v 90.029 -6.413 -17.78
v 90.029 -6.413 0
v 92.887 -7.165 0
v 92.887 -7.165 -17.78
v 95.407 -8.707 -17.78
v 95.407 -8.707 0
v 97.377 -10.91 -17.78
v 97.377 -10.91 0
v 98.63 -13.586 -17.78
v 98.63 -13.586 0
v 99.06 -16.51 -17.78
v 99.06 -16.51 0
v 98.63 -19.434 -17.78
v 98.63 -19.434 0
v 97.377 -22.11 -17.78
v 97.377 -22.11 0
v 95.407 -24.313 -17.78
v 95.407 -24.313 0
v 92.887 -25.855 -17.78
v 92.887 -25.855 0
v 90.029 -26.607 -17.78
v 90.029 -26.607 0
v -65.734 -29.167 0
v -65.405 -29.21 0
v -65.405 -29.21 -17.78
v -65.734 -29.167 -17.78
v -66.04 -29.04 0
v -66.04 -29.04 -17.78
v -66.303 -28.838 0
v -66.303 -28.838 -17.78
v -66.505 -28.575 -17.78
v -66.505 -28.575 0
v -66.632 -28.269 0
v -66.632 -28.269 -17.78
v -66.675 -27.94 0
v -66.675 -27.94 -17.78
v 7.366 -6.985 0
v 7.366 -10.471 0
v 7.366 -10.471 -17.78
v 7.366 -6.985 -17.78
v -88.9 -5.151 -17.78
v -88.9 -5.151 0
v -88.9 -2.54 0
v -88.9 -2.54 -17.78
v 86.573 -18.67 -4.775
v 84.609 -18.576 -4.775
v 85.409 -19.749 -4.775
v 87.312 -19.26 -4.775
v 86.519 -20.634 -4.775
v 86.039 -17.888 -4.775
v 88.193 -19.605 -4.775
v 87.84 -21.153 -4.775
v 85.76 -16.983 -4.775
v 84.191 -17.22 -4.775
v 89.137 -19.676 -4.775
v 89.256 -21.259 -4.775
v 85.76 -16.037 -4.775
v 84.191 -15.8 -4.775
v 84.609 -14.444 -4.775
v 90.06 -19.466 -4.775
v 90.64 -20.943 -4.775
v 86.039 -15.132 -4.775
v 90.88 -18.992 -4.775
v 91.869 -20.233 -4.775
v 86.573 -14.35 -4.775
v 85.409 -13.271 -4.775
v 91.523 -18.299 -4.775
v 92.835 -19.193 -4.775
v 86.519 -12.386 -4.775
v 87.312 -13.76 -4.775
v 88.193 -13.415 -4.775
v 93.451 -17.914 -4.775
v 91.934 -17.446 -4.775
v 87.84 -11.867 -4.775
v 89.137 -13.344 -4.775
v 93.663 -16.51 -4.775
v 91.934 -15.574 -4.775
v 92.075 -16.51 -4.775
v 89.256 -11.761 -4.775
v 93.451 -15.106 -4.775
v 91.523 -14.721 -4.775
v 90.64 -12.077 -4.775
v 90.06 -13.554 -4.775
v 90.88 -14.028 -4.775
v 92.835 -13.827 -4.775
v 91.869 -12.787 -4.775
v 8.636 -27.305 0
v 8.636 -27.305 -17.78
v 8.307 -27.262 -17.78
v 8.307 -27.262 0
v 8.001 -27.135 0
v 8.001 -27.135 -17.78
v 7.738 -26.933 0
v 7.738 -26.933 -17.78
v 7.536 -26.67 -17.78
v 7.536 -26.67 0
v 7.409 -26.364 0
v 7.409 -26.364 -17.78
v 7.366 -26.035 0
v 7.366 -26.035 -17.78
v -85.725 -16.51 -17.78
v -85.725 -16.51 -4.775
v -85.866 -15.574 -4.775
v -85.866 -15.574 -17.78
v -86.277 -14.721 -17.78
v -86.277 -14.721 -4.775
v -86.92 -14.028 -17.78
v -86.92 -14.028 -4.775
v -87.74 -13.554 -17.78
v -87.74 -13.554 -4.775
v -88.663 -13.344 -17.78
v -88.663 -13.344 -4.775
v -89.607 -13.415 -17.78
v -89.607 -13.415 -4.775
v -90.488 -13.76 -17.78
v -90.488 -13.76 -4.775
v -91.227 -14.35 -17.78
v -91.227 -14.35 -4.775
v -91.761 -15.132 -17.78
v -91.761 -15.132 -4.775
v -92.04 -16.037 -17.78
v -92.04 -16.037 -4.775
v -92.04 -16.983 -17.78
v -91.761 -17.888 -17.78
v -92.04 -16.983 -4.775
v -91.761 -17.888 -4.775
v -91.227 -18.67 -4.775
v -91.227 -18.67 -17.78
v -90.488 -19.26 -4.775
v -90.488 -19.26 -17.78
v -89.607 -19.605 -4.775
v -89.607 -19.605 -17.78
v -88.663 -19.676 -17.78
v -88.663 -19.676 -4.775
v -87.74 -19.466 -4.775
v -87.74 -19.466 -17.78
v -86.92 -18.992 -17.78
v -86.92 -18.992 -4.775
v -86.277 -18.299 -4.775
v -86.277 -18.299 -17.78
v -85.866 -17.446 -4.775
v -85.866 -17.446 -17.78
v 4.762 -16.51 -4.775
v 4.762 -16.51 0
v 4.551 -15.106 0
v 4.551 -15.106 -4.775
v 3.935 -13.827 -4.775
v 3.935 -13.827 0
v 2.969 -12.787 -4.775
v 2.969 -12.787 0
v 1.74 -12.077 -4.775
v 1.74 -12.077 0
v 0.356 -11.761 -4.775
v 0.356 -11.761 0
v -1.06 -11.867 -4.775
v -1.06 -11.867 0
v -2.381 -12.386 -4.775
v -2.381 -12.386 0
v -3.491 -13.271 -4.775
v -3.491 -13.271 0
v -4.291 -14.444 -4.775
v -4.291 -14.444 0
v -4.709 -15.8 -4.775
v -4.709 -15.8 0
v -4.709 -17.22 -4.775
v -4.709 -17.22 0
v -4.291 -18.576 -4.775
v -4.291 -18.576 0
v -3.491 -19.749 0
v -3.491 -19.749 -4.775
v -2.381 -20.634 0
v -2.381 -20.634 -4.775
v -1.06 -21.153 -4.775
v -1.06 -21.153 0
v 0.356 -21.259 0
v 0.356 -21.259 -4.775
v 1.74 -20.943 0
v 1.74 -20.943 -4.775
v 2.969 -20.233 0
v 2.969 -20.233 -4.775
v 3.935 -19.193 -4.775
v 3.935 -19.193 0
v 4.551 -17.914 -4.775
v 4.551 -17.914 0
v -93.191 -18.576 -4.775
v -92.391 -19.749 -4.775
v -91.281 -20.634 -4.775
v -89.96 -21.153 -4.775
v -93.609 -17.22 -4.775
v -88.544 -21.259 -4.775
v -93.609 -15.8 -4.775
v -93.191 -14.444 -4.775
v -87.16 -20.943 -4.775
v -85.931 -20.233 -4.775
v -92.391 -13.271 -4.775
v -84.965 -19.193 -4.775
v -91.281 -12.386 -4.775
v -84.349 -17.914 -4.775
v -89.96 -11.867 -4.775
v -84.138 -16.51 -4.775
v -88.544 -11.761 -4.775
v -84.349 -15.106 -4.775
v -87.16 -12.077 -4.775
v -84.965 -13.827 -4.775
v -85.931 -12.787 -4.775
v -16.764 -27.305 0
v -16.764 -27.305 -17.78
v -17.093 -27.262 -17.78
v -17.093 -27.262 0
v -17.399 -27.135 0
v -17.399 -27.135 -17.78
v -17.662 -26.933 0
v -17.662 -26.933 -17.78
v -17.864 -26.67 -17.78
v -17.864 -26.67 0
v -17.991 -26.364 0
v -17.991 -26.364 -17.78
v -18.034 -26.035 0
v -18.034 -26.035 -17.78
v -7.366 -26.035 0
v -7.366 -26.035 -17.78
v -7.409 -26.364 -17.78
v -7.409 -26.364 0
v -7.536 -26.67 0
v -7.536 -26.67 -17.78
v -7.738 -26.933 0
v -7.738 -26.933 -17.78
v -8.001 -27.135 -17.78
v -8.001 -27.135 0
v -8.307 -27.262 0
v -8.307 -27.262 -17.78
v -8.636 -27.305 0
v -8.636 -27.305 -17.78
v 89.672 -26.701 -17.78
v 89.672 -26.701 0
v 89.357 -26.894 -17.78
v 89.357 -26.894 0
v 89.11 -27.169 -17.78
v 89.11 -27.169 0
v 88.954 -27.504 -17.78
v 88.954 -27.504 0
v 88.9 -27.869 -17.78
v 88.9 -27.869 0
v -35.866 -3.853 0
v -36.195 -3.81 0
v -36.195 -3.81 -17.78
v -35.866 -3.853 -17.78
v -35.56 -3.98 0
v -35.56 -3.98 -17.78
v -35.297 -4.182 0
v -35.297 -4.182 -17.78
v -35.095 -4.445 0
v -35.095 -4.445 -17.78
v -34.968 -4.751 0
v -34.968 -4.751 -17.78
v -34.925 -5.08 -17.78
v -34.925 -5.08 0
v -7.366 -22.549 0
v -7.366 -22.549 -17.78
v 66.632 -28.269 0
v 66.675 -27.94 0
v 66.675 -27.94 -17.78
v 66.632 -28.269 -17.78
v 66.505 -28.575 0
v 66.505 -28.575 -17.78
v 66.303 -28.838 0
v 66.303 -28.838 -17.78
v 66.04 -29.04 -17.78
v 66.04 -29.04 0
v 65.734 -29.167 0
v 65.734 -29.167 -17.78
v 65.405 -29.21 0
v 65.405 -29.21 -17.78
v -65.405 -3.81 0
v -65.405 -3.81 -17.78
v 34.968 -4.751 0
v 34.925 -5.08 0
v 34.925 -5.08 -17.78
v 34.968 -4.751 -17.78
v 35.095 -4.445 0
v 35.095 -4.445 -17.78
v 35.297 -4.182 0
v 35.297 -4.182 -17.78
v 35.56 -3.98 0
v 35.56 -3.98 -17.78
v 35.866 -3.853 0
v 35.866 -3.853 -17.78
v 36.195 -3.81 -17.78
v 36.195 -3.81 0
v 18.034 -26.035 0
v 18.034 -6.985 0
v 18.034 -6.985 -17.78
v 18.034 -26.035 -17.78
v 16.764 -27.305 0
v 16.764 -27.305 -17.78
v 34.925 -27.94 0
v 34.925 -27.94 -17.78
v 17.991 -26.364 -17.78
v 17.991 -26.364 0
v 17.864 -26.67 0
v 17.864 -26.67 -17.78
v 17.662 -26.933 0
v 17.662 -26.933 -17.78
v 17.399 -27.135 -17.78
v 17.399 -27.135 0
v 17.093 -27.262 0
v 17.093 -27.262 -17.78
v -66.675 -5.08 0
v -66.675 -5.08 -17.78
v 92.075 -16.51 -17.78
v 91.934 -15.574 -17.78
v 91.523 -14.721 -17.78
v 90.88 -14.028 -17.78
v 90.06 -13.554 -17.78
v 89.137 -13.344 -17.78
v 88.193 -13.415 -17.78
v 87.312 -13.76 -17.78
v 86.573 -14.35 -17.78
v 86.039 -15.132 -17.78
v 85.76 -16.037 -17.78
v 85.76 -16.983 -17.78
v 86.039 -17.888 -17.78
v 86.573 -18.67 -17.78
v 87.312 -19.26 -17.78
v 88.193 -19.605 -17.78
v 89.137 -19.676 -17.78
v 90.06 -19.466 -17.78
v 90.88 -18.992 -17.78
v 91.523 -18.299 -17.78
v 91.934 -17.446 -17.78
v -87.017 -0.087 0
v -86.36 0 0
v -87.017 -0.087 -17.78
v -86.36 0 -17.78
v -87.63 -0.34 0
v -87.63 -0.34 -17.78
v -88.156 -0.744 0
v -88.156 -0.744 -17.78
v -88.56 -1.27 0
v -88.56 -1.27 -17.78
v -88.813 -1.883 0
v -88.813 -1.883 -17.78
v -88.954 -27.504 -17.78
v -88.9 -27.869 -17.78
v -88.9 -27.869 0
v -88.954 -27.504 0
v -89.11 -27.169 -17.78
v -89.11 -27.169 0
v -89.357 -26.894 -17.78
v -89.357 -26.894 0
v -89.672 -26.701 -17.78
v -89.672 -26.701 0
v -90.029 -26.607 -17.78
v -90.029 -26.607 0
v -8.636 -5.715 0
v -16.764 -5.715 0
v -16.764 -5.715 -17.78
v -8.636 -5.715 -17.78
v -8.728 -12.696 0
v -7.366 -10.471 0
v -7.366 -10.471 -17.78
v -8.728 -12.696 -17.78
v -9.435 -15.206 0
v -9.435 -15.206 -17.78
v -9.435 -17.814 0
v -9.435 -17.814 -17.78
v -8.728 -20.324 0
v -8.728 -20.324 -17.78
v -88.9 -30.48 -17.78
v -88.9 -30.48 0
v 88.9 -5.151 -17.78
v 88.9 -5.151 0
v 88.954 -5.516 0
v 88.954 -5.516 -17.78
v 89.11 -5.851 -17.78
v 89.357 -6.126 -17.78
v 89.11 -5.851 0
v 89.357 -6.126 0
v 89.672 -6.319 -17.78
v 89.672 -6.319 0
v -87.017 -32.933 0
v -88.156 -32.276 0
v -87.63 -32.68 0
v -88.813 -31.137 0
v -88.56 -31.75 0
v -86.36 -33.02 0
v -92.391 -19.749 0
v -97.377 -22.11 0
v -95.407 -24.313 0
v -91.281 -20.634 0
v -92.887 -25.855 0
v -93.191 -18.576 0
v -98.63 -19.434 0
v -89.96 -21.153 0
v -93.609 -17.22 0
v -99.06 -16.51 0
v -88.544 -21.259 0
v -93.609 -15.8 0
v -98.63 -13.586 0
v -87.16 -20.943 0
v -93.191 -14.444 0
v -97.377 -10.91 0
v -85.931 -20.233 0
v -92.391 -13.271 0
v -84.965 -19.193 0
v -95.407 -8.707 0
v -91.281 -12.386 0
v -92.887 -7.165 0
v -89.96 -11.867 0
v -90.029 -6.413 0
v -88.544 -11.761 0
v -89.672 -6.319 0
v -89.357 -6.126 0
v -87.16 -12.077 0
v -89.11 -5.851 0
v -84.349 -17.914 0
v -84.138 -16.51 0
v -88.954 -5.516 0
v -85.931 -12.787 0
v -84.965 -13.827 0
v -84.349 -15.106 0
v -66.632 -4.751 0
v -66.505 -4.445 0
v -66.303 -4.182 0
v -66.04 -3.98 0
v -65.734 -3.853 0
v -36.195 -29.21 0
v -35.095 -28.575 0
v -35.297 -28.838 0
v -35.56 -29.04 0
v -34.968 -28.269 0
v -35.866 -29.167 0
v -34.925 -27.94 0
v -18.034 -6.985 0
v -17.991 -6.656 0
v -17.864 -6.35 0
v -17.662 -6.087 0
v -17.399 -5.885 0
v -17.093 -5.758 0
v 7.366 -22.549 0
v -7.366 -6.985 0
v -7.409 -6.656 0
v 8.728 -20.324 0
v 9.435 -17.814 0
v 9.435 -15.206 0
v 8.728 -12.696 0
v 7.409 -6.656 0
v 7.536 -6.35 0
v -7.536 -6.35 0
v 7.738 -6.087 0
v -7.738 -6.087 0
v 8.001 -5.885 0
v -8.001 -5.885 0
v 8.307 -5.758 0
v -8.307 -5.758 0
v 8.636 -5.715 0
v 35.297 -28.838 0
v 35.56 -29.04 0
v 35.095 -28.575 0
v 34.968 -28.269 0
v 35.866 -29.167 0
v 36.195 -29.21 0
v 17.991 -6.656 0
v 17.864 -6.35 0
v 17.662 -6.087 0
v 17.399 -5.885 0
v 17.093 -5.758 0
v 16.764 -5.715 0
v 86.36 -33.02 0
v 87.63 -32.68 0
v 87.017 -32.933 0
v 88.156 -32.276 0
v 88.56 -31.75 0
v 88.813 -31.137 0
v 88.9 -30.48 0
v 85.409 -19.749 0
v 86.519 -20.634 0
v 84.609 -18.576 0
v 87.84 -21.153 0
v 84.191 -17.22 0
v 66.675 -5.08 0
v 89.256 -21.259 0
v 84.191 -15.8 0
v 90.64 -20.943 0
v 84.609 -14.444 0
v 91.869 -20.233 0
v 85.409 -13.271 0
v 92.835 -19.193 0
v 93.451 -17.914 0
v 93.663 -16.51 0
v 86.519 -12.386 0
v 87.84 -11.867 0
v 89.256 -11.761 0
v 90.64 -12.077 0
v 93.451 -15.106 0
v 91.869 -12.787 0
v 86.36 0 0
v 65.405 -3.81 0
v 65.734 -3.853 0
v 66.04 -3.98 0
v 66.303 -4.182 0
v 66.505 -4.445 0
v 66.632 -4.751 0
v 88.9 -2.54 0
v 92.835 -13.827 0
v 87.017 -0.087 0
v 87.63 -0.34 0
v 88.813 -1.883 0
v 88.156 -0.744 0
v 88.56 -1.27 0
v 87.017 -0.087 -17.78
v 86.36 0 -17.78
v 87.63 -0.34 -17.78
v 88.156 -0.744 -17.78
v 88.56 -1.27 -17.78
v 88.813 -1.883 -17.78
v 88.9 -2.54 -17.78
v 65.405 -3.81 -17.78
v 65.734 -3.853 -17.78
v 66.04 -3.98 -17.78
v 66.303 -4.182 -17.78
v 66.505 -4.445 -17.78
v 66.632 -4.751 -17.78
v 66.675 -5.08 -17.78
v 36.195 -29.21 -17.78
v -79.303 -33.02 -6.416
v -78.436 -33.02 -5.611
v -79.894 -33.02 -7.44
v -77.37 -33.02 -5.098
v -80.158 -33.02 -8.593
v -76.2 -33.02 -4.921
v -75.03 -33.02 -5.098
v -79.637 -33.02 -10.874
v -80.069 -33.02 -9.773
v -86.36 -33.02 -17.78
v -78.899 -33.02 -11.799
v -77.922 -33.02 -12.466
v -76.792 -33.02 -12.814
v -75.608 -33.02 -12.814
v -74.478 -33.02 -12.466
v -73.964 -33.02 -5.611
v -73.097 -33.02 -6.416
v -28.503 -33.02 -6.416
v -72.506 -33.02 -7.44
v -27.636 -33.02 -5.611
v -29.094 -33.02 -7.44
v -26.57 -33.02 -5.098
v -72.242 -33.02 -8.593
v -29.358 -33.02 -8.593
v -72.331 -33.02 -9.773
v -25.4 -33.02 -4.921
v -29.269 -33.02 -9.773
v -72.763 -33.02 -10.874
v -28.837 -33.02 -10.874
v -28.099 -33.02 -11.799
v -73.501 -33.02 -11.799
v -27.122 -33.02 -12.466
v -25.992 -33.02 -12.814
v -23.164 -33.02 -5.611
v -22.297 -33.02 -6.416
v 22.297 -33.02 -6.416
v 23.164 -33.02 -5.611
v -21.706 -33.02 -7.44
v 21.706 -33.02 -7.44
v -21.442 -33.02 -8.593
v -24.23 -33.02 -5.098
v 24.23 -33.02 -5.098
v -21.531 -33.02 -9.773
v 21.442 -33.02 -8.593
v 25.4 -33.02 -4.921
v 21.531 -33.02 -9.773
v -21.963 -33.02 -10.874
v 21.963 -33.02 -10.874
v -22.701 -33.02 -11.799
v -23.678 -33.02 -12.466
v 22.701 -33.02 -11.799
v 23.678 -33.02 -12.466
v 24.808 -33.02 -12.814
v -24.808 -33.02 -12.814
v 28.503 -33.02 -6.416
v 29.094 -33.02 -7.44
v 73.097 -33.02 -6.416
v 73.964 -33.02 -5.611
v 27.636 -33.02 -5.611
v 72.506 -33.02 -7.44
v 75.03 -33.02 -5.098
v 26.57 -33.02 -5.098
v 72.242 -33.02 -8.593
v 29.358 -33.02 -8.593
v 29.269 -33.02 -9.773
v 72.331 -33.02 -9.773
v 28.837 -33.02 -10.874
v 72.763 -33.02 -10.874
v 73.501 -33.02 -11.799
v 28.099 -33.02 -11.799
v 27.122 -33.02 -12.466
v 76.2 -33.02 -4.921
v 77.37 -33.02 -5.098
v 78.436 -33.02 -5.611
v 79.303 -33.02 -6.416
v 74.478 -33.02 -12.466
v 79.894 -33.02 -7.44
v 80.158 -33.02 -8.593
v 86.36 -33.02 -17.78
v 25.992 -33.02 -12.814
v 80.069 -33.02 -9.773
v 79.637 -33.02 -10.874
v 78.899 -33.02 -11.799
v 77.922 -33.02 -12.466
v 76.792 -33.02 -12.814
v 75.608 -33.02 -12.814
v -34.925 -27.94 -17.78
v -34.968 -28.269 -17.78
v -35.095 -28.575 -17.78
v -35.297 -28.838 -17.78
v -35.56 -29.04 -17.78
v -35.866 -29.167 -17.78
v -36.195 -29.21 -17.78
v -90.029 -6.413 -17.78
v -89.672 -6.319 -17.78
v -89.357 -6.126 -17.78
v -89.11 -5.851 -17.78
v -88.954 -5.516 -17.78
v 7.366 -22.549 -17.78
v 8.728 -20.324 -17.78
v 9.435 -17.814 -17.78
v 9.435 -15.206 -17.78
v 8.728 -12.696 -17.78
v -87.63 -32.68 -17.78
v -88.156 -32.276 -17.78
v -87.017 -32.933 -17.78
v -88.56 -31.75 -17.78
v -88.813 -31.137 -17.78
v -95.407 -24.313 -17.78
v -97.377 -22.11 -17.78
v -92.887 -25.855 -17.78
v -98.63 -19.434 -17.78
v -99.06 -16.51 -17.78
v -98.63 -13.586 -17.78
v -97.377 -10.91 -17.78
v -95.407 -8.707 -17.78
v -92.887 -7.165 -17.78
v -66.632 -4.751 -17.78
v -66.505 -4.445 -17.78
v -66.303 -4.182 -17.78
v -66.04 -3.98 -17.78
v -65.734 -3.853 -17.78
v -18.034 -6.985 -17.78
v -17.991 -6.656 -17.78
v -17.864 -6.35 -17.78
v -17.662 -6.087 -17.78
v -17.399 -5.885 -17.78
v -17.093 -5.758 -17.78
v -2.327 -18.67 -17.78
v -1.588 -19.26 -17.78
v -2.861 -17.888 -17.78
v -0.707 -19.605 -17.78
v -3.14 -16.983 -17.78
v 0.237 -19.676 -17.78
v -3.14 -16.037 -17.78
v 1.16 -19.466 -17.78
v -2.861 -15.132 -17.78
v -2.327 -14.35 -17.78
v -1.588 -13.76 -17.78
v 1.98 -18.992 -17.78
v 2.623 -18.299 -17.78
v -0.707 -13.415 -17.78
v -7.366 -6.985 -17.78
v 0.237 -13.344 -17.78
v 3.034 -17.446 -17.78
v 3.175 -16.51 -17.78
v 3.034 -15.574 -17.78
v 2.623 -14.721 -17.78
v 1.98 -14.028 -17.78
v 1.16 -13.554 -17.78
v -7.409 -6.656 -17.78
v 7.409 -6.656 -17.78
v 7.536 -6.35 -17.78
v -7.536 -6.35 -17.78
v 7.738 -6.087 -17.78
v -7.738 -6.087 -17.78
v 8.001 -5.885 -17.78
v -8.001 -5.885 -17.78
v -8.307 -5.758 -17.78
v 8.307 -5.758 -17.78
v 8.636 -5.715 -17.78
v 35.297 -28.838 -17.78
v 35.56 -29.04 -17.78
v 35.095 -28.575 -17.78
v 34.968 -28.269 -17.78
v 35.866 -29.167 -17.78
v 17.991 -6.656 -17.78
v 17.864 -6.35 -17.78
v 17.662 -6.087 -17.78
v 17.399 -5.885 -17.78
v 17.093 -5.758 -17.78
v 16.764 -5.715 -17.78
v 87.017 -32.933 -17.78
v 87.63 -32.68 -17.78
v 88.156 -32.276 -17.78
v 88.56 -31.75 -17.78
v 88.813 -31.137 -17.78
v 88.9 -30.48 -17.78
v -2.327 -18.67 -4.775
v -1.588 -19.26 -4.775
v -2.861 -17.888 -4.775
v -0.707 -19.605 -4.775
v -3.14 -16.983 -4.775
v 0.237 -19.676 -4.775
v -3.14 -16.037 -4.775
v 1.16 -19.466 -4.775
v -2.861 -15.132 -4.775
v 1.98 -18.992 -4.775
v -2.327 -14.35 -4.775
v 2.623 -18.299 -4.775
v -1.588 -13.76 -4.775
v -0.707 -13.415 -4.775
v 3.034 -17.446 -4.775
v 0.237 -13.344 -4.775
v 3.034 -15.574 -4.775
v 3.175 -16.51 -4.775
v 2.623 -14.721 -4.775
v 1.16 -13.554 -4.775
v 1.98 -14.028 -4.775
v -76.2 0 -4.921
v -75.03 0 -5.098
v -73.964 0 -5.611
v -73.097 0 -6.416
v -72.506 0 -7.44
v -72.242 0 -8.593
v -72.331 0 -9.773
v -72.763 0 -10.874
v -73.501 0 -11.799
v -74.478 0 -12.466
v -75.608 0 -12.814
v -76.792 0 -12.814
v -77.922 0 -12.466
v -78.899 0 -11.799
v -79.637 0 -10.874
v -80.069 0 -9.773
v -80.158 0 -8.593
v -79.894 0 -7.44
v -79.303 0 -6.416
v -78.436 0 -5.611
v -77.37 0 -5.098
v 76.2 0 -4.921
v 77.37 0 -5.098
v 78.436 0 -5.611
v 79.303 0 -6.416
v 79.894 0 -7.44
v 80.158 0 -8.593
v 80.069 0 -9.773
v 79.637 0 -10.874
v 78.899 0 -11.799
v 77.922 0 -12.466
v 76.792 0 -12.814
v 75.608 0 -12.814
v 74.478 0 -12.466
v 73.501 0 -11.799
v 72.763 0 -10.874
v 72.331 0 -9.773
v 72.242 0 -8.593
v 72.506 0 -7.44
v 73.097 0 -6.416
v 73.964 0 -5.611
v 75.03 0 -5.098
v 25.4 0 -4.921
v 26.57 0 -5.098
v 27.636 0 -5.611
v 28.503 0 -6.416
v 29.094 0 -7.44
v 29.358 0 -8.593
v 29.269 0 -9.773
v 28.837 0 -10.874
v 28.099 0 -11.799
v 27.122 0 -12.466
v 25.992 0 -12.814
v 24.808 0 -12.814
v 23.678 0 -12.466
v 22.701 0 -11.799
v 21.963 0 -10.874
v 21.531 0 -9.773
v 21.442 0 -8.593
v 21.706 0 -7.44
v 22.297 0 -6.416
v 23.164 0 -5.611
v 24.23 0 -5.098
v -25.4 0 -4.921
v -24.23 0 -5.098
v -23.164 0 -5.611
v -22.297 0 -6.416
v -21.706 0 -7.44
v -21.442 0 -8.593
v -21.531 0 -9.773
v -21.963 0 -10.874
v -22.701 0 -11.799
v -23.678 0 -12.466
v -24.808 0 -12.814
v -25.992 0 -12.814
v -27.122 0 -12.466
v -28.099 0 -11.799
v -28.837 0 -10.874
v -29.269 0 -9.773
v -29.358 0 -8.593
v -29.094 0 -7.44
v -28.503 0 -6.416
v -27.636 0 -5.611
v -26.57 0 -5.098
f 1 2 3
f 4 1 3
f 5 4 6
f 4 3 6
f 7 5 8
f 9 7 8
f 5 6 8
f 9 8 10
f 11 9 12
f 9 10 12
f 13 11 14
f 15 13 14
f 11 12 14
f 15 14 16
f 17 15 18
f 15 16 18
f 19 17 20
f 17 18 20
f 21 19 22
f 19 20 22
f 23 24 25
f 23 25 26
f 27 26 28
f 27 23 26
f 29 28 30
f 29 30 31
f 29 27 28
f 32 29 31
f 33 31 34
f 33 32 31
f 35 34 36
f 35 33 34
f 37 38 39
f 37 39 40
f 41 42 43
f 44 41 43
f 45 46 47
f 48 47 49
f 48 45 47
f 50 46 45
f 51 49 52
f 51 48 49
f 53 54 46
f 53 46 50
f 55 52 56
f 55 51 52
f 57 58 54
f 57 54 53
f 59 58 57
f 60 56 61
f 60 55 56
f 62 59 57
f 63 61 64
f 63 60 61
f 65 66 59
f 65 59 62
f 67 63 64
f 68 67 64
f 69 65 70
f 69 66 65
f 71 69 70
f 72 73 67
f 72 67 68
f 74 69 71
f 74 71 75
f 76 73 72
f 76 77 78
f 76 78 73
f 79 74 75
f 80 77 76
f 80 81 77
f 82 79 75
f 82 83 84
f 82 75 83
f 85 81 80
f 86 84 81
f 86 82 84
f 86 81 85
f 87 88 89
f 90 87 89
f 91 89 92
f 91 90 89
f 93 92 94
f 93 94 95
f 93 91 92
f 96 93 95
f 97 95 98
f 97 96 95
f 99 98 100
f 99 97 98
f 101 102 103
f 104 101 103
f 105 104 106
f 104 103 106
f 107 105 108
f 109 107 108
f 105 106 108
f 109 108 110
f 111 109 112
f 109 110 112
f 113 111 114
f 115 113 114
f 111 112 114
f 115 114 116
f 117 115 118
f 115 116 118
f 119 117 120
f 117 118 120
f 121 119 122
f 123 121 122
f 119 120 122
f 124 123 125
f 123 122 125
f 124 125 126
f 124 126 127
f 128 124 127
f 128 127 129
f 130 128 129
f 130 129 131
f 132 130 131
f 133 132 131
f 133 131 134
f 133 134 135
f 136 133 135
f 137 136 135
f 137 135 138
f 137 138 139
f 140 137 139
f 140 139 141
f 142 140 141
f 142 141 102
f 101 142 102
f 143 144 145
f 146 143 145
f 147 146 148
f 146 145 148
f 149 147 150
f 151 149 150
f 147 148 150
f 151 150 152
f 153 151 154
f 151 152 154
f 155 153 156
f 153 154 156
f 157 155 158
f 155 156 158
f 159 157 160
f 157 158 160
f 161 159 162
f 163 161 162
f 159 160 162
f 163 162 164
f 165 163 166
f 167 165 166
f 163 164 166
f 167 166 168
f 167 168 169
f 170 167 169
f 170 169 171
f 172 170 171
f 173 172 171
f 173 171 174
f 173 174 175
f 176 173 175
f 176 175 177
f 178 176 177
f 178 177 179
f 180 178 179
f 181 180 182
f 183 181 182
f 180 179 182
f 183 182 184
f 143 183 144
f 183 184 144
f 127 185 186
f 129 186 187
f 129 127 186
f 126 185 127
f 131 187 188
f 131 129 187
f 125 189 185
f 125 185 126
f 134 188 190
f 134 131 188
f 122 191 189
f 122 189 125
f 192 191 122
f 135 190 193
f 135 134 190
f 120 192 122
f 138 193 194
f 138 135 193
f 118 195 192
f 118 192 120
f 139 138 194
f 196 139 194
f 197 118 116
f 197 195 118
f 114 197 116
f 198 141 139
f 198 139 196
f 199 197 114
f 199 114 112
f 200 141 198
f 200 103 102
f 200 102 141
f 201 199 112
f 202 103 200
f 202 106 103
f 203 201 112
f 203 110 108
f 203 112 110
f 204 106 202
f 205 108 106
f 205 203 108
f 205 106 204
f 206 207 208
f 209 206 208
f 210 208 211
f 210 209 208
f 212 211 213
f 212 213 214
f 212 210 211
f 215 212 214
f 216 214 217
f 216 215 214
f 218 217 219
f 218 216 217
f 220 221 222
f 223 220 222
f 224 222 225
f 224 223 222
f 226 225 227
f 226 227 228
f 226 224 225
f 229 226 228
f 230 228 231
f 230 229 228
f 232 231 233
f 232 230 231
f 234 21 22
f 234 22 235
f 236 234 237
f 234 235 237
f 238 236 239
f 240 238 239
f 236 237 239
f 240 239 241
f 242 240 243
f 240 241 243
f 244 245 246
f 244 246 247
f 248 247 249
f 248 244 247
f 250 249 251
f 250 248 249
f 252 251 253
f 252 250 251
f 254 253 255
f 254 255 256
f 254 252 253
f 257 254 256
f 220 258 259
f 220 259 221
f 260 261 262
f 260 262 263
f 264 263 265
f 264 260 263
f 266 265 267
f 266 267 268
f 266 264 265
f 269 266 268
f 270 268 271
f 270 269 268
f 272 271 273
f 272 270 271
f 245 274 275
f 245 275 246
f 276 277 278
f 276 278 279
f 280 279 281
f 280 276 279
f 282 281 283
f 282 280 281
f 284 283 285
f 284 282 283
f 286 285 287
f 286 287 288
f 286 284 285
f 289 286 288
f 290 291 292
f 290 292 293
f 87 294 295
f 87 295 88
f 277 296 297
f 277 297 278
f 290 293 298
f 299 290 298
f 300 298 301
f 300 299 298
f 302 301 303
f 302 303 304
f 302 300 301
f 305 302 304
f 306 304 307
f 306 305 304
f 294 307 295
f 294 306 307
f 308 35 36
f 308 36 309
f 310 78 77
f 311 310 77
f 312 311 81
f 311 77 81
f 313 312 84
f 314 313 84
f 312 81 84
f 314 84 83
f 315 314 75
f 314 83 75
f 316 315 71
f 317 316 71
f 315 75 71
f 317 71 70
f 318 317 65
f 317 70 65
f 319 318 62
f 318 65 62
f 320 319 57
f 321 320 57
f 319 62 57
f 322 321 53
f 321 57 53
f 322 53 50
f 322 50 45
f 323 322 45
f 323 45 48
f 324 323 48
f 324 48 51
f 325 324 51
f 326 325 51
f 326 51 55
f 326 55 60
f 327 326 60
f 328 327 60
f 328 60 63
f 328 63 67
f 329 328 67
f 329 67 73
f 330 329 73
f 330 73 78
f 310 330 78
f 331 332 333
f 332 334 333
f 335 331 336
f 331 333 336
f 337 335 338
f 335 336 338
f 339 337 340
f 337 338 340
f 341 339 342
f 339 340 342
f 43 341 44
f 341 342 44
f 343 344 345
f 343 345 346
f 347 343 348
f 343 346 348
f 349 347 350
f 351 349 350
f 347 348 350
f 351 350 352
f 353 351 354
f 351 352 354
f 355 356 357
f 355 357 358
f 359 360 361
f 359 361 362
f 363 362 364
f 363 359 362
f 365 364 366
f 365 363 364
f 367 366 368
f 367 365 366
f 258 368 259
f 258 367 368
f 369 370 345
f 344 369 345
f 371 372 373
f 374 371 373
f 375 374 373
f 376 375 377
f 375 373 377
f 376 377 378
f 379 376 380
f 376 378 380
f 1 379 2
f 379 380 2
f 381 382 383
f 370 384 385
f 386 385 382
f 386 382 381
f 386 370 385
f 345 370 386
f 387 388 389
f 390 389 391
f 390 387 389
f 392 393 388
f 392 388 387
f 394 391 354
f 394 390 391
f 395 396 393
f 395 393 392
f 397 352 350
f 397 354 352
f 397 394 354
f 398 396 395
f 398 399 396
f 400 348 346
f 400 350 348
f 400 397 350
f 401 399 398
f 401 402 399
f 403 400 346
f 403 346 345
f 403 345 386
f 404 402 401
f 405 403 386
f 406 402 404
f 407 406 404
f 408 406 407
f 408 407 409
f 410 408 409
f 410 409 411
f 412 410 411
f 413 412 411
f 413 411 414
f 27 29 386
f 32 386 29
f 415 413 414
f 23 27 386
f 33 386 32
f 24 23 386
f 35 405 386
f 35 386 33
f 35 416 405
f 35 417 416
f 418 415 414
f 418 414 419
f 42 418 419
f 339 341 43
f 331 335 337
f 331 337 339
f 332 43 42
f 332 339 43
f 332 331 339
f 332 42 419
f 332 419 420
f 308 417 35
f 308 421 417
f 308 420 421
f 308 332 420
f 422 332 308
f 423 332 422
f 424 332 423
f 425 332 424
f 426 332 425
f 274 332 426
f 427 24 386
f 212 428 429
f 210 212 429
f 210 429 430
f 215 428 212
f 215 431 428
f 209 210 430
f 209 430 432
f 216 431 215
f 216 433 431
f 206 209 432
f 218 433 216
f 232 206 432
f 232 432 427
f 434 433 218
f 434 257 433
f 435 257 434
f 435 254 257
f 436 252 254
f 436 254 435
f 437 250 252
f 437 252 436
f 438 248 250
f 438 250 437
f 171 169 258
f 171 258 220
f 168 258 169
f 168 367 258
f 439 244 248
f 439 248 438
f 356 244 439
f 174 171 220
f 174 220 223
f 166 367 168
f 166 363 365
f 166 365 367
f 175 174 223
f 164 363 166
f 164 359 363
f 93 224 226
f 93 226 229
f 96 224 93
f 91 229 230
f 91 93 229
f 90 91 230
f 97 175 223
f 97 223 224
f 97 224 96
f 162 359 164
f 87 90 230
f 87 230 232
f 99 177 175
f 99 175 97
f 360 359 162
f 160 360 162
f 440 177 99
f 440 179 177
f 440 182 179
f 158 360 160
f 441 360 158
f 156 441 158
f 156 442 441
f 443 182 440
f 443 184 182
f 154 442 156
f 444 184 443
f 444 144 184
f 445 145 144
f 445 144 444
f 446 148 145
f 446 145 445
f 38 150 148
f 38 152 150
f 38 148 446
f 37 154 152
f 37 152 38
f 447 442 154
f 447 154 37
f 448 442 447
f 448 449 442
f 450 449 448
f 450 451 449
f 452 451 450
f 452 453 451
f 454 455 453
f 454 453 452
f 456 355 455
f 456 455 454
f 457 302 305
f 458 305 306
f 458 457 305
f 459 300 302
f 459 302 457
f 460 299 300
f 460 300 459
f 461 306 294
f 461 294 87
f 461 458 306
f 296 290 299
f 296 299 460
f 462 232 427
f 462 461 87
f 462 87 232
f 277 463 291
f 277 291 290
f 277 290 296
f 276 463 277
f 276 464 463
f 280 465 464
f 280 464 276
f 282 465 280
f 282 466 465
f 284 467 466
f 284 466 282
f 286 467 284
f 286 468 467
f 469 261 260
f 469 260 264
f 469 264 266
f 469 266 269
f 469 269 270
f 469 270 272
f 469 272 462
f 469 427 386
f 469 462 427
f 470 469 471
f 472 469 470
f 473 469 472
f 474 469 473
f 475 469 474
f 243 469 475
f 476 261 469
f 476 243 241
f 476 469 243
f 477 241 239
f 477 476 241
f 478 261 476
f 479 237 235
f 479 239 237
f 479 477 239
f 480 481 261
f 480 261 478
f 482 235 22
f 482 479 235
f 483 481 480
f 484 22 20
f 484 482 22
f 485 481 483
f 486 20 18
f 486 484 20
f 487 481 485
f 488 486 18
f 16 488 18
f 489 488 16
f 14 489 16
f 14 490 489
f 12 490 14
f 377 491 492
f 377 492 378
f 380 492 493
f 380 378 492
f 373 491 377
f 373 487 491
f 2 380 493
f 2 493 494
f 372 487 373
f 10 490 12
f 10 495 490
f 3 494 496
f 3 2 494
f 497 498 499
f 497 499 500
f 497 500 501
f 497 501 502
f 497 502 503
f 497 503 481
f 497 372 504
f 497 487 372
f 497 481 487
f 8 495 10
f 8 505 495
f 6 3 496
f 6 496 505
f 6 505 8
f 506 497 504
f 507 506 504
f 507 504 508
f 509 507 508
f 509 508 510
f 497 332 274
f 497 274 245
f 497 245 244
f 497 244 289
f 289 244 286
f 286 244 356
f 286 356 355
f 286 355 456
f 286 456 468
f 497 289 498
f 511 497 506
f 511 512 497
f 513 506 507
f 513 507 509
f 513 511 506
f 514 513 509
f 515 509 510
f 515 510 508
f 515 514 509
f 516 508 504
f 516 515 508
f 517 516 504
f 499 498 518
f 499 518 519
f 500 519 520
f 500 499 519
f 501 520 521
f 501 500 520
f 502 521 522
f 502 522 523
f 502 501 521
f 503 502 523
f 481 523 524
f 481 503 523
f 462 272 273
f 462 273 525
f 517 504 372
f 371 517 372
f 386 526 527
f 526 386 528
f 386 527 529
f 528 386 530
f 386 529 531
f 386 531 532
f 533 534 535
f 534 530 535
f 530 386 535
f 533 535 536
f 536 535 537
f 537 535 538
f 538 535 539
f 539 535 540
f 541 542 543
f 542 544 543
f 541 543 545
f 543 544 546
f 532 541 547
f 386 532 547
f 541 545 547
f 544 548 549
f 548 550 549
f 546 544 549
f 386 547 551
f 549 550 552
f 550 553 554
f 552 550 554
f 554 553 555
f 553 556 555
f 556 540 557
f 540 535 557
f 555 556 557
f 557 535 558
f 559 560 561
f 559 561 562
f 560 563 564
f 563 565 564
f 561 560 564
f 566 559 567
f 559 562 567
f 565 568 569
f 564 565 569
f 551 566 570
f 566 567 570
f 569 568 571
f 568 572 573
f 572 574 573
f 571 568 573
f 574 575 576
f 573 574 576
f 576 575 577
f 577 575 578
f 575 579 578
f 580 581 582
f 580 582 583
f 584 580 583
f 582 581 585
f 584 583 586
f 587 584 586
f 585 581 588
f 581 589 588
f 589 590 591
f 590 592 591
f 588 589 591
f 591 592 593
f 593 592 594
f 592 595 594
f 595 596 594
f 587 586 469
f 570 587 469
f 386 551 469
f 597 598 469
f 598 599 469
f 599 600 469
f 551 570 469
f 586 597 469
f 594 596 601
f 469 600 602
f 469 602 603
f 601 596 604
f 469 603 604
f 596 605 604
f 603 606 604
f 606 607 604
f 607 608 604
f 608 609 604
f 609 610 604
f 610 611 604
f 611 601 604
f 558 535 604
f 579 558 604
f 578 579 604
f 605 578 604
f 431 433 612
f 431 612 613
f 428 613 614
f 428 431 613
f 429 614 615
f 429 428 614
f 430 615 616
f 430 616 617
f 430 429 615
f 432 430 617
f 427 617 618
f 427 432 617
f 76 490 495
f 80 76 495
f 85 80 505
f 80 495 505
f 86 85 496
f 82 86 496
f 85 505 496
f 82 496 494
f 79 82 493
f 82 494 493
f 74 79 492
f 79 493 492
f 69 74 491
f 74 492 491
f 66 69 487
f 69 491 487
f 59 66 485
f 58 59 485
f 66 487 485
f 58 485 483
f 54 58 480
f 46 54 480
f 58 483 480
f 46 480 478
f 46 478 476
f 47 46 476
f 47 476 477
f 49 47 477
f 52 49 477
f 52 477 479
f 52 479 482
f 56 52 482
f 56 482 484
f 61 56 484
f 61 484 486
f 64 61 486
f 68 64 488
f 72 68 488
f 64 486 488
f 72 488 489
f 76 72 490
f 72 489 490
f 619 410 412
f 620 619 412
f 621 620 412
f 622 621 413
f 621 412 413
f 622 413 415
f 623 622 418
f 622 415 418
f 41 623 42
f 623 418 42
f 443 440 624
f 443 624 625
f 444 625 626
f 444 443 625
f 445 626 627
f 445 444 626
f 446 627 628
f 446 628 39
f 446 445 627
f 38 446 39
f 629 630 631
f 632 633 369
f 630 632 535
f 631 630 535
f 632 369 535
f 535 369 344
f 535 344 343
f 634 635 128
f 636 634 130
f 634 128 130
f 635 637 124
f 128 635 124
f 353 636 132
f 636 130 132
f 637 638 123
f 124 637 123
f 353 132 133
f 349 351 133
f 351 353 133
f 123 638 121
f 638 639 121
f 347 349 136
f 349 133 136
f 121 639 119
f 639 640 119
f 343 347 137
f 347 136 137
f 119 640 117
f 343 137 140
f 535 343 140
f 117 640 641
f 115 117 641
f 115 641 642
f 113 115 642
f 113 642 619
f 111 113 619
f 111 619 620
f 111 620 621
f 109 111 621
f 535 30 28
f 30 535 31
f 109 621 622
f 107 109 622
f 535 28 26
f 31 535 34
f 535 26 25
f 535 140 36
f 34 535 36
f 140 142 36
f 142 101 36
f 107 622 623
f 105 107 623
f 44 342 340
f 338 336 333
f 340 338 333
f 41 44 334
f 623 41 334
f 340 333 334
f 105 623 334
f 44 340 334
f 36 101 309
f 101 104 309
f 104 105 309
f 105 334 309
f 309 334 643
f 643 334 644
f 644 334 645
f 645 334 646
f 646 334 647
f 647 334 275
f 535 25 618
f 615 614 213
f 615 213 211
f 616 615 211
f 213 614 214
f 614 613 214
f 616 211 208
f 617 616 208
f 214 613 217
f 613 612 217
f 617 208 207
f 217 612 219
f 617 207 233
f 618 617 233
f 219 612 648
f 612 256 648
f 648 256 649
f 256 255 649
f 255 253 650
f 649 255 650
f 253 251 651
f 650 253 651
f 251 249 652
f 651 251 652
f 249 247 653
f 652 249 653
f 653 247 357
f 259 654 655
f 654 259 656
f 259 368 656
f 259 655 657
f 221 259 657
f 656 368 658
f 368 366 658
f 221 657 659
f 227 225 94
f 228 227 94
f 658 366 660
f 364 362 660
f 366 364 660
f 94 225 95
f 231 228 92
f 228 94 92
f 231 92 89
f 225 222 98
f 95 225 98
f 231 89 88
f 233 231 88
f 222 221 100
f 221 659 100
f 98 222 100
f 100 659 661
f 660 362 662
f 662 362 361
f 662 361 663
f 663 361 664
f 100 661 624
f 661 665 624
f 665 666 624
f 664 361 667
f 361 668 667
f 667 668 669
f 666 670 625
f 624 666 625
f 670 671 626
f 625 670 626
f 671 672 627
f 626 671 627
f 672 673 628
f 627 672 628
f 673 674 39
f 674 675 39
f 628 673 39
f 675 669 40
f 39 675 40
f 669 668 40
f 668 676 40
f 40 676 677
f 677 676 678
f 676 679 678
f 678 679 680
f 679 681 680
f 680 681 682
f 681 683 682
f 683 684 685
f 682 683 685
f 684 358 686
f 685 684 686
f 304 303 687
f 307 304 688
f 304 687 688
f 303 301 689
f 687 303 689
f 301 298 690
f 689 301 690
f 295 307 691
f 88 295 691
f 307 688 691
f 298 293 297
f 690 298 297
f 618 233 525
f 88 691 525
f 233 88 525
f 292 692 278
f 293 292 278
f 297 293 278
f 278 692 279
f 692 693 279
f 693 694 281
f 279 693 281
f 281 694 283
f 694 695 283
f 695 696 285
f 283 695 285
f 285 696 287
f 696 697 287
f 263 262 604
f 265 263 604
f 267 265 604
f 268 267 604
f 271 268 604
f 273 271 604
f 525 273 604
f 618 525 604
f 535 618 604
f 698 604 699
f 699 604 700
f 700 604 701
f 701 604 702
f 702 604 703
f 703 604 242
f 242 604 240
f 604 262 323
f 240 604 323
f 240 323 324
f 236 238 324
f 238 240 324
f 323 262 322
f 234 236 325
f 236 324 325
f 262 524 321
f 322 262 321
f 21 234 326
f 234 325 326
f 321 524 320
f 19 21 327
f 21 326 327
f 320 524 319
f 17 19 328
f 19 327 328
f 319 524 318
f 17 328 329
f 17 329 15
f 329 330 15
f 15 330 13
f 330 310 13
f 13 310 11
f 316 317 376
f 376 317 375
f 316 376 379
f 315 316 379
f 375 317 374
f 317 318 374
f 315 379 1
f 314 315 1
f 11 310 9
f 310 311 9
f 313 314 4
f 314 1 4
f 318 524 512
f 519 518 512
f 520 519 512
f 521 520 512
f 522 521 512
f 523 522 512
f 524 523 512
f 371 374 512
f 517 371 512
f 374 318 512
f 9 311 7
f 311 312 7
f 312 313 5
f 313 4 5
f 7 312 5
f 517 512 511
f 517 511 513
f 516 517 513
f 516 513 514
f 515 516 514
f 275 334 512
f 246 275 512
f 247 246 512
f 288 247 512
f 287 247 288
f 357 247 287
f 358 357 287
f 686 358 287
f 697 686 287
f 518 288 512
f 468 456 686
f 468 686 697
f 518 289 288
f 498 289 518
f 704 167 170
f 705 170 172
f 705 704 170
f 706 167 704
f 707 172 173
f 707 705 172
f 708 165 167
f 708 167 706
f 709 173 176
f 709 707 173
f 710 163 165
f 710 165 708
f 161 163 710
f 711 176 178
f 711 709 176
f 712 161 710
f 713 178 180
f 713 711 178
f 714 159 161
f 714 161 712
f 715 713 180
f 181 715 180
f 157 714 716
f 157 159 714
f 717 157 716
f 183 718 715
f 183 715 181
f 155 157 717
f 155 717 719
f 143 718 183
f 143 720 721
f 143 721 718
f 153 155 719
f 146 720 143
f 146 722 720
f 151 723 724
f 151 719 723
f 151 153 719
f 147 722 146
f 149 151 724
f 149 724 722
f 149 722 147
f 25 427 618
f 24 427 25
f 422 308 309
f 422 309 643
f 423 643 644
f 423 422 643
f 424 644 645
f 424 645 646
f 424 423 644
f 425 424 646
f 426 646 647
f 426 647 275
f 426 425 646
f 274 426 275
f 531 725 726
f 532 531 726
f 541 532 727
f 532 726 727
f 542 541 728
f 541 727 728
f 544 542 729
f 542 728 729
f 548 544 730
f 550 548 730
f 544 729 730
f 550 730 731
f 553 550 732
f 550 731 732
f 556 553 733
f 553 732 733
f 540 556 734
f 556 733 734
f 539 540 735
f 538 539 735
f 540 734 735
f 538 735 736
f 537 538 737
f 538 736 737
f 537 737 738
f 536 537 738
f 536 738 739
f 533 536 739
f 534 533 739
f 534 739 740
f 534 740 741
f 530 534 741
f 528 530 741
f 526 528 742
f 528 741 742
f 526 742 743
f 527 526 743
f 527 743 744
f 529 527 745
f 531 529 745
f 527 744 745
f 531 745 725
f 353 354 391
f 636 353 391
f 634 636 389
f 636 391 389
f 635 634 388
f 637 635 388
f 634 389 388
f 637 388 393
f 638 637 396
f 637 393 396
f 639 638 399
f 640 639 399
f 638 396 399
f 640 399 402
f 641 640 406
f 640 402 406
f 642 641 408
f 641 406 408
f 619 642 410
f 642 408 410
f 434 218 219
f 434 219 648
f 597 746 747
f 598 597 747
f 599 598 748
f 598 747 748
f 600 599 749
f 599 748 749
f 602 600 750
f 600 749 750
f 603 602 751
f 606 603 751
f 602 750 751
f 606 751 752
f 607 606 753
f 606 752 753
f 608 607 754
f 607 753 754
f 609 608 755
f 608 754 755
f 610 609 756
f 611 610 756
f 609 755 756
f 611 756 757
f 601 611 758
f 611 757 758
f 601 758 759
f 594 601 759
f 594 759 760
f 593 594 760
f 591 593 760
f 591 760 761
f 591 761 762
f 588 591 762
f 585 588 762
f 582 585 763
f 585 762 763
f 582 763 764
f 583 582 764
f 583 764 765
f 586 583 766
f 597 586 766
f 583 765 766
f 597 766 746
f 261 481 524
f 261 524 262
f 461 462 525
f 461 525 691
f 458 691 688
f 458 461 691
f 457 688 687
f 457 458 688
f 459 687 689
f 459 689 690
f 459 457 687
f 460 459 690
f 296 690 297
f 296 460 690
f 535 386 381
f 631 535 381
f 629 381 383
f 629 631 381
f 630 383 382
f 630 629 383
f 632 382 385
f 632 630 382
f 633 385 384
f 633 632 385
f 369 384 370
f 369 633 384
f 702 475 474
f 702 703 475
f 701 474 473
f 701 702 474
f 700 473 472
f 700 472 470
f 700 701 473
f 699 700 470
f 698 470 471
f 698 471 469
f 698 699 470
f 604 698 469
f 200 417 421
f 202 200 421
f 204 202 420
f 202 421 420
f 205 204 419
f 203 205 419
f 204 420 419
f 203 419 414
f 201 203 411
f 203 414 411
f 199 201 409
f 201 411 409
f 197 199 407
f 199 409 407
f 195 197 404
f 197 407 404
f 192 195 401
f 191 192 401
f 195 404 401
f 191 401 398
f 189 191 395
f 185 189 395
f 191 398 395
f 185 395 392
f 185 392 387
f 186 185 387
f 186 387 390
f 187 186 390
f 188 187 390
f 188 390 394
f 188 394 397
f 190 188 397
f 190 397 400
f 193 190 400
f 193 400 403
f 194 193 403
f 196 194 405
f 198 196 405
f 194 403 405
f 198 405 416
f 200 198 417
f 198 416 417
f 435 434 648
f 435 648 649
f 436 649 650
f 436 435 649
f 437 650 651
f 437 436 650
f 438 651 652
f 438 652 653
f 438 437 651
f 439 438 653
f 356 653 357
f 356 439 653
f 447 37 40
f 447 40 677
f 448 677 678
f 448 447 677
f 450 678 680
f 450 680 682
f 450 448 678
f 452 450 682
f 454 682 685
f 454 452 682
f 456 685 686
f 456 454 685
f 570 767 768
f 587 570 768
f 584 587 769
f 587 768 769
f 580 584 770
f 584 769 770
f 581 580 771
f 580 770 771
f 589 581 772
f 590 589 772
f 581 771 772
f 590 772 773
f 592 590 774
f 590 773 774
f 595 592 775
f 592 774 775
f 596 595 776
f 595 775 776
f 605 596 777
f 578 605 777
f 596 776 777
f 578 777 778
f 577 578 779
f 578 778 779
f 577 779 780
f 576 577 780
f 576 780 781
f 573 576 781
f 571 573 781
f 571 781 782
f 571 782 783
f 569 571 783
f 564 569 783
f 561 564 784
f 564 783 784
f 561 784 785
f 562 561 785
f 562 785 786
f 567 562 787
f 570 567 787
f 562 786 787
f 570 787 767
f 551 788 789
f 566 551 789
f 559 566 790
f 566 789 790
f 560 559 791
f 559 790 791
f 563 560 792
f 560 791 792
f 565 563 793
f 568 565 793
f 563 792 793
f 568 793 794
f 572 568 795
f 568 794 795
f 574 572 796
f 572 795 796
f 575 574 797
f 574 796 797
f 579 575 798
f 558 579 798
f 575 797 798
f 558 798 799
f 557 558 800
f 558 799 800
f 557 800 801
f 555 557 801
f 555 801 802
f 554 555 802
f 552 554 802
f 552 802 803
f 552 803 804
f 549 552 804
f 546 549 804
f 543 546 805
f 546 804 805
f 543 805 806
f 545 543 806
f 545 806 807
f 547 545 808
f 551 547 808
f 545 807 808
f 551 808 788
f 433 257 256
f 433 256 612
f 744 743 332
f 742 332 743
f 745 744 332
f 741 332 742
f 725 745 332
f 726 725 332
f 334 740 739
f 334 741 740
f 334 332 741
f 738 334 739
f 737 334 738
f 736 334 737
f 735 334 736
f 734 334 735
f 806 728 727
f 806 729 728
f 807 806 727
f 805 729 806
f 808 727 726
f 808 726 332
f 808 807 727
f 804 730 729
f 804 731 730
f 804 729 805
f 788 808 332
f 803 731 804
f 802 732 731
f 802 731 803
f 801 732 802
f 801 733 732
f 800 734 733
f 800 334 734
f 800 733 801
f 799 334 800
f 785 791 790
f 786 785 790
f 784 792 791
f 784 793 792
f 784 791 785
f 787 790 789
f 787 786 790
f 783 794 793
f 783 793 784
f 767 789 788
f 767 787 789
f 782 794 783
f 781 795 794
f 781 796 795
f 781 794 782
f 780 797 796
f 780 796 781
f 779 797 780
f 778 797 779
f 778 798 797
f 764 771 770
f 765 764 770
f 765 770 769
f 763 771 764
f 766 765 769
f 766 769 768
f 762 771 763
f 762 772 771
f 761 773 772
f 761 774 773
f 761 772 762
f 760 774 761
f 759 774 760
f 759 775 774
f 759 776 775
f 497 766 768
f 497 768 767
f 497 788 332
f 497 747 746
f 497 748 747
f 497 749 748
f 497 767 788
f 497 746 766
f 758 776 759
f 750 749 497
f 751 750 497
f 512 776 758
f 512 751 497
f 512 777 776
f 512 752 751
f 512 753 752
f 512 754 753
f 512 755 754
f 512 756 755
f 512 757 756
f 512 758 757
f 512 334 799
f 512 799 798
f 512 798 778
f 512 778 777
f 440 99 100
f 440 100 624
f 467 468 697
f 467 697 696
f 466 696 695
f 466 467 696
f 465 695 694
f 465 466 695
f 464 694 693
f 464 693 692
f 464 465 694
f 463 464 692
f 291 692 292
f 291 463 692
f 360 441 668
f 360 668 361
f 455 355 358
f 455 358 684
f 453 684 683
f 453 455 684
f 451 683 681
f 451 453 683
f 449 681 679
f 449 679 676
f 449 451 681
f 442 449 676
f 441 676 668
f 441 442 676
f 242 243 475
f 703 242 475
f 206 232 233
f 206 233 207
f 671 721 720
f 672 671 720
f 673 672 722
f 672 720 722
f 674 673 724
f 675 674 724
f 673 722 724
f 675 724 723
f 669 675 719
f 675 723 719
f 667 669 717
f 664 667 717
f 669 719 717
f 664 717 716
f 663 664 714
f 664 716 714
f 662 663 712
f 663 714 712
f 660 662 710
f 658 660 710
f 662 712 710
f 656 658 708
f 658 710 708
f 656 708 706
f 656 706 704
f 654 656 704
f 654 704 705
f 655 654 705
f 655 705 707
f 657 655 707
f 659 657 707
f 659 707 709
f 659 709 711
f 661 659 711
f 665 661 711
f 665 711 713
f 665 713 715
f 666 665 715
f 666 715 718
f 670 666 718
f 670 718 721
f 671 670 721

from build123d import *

# Parameters (mm, degrees)
SKETCH1_W           = 203.2
SKETCH1_H           = 17.78
SKETCH1_R           = 3.96875
BOSS_EXTRUDE1_DEPTH = 33.02
SKETCH2_R           = 3.175
CUT_EXTRUDE1_DEPTH  = 17.78
SKETCH3_R           = 4.7625
CUT_EXTRUDE2_DEPTH  = 4.7752
CUT_EXTRUDE3_DEPTH  = 17.78
CUT_EXTRUDE4_DEPTH  = 17.78
FILLET1_R           = 2.54


with BuildPart() as part:
    # Sketch1 → Boss-Extrude1 (new body)
    with BuildSketch(Plane(origin=(0, 0, 0), x_dir=(1, 0, 0), z_dir=(0, 1, 0))):
        with Locations((0, 8.89)):
            Rectangle(SKETCH1_W, SKETCH1_H)
        with Locations(Location((76.2, 8.89, 0), (0, 0, 270))):
            Circle(SKETCH1_R, mode=Mode.SUBTRACT)
        with Locations(Location((25.4, 8.89, 0), (0, 0, 270))):
            Circle(SKETCH1_R, mode=Mode.SUBTRACT)
        with Locations(Location((-25.4, 8.89, 0), (0, 0, 270))):
            Circle(SKETCH1_R, mode=Mode.SUBTRACT)
        with Locations(Location((-76.2, 8.89, 0), (0, 0, 270))):
            Circle(SKETCH1_R, mode=Mode.SUBTRACT)
    extrude(amount=-BOSS_EXTRUDE1_DEPTH)

    # Sketch2 → Cut-Extrude1 (cut)
    with BuildSketch(Plane.XY):
        with Locations((88.9, -16.51)):
            Circle(SKETCH2_R)
        with Locations((0, -16.51)):
            Circle(SKETCH2_R)
        with Locations((-88.9, -16.51)):
            Circle(SKETCH2_R)
    extrude(amount=-CUT_EXTRUDE1_DEPTH, mode=Mode.SUBTRACT)

    # Sketch3 → Cut-Extrude2 (cut)
    with BuildSketch(Plane.XY):
        with Locations((88.9, -16.51)):
            Circle(SKETCH3_R)
        with Locations((0, -16.51)):
            Circle(SKETCH3_R)
        with Locations((-88.9, -16.51)):
            Circle(SKETCH3_R)
    extrude(amount=-CUT_EXTRUDE2_DEPTH, mode=Mode.SUBTRACT)

    # Sketch4 → Cut-Extrude3 (cut)
    with BuildSketch(Plane.XY):
        with BuildLine():
            Line((-36.195, -29.21), (-65.405, -29.21))
            ThreePointArc((-65.405, -29.21), (-66.303025612, -28.838025612), (-66.675, -27.94))
            Line((-66.675, -27.94), (-66.675, -5.08))
            ThreePointArc((-66.675, -5.08), (-66.303025612, -4.181974388), (-65.405, -3.81))
            Line((-65.405, -3.81), (-36.195, -3.81))
            ThreePointArc((-36.195, -3.81), (-35.296974388, -4.181974388), (-34.925, -5.08))
            Line((-34.925, -5.08), (-34.925, -27.94))
            ThreePointArc((-34.925, -27.94), (-35.296974388, -28.838025612), (-36.195, -29.21))
        make_face()
        with BuildLine():
            Line((-8.636, -27.305), (-16.764, -27.305))
            ThreePointArc((-16.764, -27.305), (-17.662025612, -26.933025612), (-18.034, -26.035))
            Line((-18.034, -26.035), (-18.034, -6.985))
            ThreePointArc((-18.034, -6.985), (-17.662025612, -6.086974388), (-16.764, -5.715))
            Line((-16.764, -5.715), (-8.636, -5.715))
            ThreePointArc((-8.636, -5.715), (-7.737974388, -6.086974388), (-7.366, -6.985))
            Line((-7.366, -6.985), (-7.366, -10.471153339))
            ThreePointArc((-7.366, -10.471153339), (-9.525, -16.51), (-7.366, -22.548846661))
            Line((-7.366, -22.548846661), (-7.366, -26.035))
            ThreePointArc((-7.366, -26.035), (-7.737974388, -26.933025612), (-8.636, -27.305))
        make_face()
        with BuildLine():
            Line((36.195, -3.81), (65.405, -3.81))
            ThreePointArc((65.405, -3.81), (66.303025612, -4.181974388), (66.675, -5.08))
            Line((66.675, -5.08), (66.675, -27.94))
            ThreePointArc((66.675, -27.94), (66.303025612, -28.838025612), (65.405, -29.21))
            Line((65.405, -29.21), (36.195, -29.21))
            ThreePointArc((36.195, -29.21), (35.296974388, -28.838025612), (34.925, -27.94))
            Line((34.925, -27.94), (34.925, -5.08))
            ThreePointArc((34.925, -5.08), (35.296974388, -4.181974388), (36.195, -3.81))
        make_face()
        with BuildLine():
            Line((7.366, -26.035), (7.366, -22.548846661))
            ThreePointArc((7.366, -22.548846661), (9.525, -16.51), (7.366, -10.471153339))
            Line((7.366, -10.471153339), (7.366, -6.985))
            ThreePointArc((7.366, -6.985), (7.737974388, -6.086974388), (8.636, -5.715))
            Line((8.636, -5.715), (16.764, -5.715))
            ThreePointArc((16.764, -5.715), (17.662025612, -6.086974388), (18.034, -6.985))
            Line((18.034, -6.985), (18.034, -26.035))
            ThreePointArc((18.034, -26.035), (17.662025612, -26.933025612), (16.764, -27.305))
            Line((16.764, -27.305), (8.636, -27.305))
            ThreePointArc((8.636, -27.305), (7.737974388, -26.933025612), (7.366, -26.035))
        make_face()
    extrude(amount=-CUT_EXTRUDE3_DEPTH, mode=Mode.SUBTRACT)

    # Sketch5 → Cut-Extrude4 (cut)
    with BuildSketch(Plane.XY):
        with BuildLine():
            Line((88.9, -27.869225326), (88.9, -33.02))
            Line((88.9, -33.02), (101.6, -33.02))
            Line((101.6, -33.02), (101.6, 0))
            Line((101.6, 0), (88.9, 0))
            Line((88.9, 0), (88.9, -5.150774674))
            ThreePointArc((88.9, -5.150774674), (89.22339789, -5.997441341), (90.028888889, -6.412910822))
            ThreePointArc((90.028888889, -6.412910822), (99.06, -16.51), (90.028888889, -26.607089178))
            ThreePointArc((90.028888889, -26.607089178), (89.22339789, -27.022558659), (88.9, -27.869225326))
        make_face()
        with BuildLine():
            Line((-88.9, -5.150774674), (-88.9, 0))
            Line((-88.9, 0), (-101.6, 0))
            Line((-101.6, 0), (-101.6, -33.02))
            Line((-101.6, -33.02), (-88.9, -33.02))
            Line((-88.9, -33.02), (-88.9, -27.869225326))
            ThreePointArc((-88.9, -27.869225326), (-89.22339789, -27.022558659), (-90.028888889, -26.607089178))
            ThreePointArc((-90.028888889, -26.607089178), (-99.06, -16.51), (-90.028888889, -6.412910822))
            ThreePointArc((-90.028888889, -6.412910822), (-89.22339789, -5.997441341), (-88.9, -5.150774674))
        make_face()
    extrude(amount=-CUT_EXTRUDE4_DEPTH, mode=Mode.SUBTRACT)

    # Fillet1
    fillet1_edges = [part.edges().sort_by_distance(p)[0] for p in [
        (88.9, 0, -8.89),
        (88.9, -33.02, -8.89),
        (-88.9, 0, -8.89),
        (-88.9, -33.02, -8.89),
    ]]
    fillet(fillet1_edges, radius=FILLET1_R)


solid = part.part
